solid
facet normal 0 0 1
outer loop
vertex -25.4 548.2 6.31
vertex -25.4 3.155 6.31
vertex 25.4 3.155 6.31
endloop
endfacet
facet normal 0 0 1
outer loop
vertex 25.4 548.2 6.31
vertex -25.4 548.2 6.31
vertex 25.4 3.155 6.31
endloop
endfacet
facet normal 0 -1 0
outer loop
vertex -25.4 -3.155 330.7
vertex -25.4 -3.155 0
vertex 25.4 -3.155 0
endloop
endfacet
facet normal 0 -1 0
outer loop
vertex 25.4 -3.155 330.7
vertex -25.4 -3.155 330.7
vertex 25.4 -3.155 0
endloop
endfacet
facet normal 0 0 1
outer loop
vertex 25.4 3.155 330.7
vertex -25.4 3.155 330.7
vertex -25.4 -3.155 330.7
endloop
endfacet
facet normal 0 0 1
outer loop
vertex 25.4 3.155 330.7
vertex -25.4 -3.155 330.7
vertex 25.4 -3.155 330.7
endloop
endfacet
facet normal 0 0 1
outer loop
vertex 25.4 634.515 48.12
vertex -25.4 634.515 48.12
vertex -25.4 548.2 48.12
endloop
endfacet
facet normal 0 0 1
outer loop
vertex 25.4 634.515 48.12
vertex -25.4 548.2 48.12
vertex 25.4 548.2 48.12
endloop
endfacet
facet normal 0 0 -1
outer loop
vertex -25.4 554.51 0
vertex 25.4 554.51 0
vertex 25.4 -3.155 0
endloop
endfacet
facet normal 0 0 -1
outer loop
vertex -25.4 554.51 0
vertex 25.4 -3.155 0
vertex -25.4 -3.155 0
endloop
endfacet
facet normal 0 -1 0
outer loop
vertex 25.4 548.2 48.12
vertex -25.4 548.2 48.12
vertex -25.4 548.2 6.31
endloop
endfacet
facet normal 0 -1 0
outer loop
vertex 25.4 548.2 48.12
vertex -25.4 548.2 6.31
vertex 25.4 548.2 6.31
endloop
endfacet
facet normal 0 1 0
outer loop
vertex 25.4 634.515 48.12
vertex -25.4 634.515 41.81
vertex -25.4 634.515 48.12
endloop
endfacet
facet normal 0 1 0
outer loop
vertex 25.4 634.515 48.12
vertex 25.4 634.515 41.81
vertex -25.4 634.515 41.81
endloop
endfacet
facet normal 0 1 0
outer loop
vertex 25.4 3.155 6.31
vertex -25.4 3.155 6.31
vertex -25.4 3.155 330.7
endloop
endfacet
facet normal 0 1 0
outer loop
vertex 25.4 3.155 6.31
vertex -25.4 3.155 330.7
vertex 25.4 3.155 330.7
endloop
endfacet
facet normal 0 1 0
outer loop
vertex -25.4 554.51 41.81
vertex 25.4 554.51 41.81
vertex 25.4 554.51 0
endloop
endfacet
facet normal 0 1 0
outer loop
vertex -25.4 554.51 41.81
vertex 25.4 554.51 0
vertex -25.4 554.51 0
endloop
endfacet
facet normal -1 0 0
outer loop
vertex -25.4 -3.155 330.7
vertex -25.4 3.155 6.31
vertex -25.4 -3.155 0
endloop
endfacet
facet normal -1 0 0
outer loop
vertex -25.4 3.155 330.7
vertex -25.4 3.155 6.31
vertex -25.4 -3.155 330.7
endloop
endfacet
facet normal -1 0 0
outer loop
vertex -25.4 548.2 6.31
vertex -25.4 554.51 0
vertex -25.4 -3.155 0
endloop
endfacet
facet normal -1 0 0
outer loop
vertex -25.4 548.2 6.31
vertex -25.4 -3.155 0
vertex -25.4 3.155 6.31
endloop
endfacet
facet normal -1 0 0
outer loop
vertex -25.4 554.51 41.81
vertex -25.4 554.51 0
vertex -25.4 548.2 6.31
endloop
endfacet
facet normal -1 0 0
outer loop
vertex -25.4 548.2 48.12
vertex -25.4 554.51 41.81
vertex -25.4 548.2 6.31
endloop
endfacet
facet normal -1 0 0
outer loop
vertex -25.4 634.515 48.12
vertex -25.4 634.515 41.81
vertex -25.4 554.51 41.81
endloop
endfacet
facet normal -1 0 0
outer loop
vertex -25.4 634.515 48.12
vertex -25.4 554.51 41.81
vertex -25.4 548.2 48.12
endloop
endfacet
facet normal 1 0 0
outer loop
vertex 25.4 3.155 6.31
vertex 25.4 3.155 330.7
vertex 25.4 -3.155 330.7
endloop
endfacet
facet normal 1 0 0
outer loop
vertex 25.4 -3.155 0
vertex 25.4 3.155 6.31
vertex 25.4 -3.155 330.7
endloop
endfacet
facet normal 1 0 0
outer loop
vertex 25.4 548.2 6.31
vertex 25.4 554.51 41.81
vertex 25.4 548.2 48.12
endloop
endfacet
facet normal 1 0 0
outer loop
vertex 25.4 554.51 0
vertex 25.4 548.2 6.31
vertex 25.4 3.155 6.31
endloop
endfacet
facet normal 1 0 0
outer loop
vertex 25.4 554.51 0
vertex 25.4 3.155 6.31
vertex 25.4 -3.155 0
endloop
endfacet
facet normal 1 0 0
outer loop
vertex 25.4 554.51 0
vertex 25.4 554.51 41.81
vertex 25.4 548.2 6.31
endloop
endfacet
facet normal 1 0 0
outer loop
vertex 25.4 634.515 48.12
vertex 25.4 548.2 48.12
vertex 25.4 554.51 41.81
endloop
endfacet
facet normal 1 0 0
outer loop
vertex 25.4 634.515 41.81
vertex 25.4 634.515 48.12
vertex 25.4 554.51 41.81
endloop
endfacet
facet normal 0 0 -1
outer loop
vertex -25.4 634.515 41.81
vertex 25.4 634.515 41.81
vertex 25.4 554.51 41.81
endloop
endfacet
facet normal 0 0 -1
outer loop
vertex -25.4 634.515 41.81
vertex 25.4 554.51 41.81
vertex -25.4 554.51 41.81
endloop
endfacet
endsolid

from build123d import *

# Parameters (mm, degrees)
CROQUIS1_W              = 50.8
CROQUIS1_H              = 6.31
SALIENTE_EXTRUIR1_DEPTH = 330.7
CROQUIS3_W              = 50.8
CROQUIS3_H              = 6.31
SALIENTE_EXTRUIR2_DEPTH = 544.51
CROQUIS4_W              = 50.8
CROQUIS4_H              = 6.31


with BuildPart() as part:
    # Croquis1 → Saliente-Extruir1 (new body)
    with BuildSketch(Plane.XY):
        Rectangle(CROQUIS1_W, CROQUIS1_H)
    extrude(amount=SALIENTE_EXTRUIR1_DEPTH)

    # Croquis3 → Saliente-Extruir2 (add)
    with BuildSketch(Plane.XZ.offset(3.155)):
        with Locations((0, 3.155)):
            Rectangle(CROQUIS3_W, CROQUIS3_H)
    extrude(amount=-SALIENTE_EXTRUIR2_DEPTH)

    # Barrer1: sweep along a curve in space
    with BuildLine() as barrer1_path:
        Line((0, 541.355, 3.155), (0, 551.355, 3.155))
        Line((0, 551.355, 3.155), (0, 551.355, 44.965))
        Line((0, 551.355, 44.965), (0, 634.515, 44.965))
    # Croquis4 → Barrer1 (sweep)
    with BuildSketch(Plane(origin=(0, 541.355, 0), x_dir=(1, 0, 0), z_dir=(0, 1, 0))):
        with Locations((0, -3.155)):
            Rectangle(CROQUIS4_W, CROQUIS4_H)
    sweep(path=barrer1_path.line, transition=Transition.RIGHT)


solid = part.part
